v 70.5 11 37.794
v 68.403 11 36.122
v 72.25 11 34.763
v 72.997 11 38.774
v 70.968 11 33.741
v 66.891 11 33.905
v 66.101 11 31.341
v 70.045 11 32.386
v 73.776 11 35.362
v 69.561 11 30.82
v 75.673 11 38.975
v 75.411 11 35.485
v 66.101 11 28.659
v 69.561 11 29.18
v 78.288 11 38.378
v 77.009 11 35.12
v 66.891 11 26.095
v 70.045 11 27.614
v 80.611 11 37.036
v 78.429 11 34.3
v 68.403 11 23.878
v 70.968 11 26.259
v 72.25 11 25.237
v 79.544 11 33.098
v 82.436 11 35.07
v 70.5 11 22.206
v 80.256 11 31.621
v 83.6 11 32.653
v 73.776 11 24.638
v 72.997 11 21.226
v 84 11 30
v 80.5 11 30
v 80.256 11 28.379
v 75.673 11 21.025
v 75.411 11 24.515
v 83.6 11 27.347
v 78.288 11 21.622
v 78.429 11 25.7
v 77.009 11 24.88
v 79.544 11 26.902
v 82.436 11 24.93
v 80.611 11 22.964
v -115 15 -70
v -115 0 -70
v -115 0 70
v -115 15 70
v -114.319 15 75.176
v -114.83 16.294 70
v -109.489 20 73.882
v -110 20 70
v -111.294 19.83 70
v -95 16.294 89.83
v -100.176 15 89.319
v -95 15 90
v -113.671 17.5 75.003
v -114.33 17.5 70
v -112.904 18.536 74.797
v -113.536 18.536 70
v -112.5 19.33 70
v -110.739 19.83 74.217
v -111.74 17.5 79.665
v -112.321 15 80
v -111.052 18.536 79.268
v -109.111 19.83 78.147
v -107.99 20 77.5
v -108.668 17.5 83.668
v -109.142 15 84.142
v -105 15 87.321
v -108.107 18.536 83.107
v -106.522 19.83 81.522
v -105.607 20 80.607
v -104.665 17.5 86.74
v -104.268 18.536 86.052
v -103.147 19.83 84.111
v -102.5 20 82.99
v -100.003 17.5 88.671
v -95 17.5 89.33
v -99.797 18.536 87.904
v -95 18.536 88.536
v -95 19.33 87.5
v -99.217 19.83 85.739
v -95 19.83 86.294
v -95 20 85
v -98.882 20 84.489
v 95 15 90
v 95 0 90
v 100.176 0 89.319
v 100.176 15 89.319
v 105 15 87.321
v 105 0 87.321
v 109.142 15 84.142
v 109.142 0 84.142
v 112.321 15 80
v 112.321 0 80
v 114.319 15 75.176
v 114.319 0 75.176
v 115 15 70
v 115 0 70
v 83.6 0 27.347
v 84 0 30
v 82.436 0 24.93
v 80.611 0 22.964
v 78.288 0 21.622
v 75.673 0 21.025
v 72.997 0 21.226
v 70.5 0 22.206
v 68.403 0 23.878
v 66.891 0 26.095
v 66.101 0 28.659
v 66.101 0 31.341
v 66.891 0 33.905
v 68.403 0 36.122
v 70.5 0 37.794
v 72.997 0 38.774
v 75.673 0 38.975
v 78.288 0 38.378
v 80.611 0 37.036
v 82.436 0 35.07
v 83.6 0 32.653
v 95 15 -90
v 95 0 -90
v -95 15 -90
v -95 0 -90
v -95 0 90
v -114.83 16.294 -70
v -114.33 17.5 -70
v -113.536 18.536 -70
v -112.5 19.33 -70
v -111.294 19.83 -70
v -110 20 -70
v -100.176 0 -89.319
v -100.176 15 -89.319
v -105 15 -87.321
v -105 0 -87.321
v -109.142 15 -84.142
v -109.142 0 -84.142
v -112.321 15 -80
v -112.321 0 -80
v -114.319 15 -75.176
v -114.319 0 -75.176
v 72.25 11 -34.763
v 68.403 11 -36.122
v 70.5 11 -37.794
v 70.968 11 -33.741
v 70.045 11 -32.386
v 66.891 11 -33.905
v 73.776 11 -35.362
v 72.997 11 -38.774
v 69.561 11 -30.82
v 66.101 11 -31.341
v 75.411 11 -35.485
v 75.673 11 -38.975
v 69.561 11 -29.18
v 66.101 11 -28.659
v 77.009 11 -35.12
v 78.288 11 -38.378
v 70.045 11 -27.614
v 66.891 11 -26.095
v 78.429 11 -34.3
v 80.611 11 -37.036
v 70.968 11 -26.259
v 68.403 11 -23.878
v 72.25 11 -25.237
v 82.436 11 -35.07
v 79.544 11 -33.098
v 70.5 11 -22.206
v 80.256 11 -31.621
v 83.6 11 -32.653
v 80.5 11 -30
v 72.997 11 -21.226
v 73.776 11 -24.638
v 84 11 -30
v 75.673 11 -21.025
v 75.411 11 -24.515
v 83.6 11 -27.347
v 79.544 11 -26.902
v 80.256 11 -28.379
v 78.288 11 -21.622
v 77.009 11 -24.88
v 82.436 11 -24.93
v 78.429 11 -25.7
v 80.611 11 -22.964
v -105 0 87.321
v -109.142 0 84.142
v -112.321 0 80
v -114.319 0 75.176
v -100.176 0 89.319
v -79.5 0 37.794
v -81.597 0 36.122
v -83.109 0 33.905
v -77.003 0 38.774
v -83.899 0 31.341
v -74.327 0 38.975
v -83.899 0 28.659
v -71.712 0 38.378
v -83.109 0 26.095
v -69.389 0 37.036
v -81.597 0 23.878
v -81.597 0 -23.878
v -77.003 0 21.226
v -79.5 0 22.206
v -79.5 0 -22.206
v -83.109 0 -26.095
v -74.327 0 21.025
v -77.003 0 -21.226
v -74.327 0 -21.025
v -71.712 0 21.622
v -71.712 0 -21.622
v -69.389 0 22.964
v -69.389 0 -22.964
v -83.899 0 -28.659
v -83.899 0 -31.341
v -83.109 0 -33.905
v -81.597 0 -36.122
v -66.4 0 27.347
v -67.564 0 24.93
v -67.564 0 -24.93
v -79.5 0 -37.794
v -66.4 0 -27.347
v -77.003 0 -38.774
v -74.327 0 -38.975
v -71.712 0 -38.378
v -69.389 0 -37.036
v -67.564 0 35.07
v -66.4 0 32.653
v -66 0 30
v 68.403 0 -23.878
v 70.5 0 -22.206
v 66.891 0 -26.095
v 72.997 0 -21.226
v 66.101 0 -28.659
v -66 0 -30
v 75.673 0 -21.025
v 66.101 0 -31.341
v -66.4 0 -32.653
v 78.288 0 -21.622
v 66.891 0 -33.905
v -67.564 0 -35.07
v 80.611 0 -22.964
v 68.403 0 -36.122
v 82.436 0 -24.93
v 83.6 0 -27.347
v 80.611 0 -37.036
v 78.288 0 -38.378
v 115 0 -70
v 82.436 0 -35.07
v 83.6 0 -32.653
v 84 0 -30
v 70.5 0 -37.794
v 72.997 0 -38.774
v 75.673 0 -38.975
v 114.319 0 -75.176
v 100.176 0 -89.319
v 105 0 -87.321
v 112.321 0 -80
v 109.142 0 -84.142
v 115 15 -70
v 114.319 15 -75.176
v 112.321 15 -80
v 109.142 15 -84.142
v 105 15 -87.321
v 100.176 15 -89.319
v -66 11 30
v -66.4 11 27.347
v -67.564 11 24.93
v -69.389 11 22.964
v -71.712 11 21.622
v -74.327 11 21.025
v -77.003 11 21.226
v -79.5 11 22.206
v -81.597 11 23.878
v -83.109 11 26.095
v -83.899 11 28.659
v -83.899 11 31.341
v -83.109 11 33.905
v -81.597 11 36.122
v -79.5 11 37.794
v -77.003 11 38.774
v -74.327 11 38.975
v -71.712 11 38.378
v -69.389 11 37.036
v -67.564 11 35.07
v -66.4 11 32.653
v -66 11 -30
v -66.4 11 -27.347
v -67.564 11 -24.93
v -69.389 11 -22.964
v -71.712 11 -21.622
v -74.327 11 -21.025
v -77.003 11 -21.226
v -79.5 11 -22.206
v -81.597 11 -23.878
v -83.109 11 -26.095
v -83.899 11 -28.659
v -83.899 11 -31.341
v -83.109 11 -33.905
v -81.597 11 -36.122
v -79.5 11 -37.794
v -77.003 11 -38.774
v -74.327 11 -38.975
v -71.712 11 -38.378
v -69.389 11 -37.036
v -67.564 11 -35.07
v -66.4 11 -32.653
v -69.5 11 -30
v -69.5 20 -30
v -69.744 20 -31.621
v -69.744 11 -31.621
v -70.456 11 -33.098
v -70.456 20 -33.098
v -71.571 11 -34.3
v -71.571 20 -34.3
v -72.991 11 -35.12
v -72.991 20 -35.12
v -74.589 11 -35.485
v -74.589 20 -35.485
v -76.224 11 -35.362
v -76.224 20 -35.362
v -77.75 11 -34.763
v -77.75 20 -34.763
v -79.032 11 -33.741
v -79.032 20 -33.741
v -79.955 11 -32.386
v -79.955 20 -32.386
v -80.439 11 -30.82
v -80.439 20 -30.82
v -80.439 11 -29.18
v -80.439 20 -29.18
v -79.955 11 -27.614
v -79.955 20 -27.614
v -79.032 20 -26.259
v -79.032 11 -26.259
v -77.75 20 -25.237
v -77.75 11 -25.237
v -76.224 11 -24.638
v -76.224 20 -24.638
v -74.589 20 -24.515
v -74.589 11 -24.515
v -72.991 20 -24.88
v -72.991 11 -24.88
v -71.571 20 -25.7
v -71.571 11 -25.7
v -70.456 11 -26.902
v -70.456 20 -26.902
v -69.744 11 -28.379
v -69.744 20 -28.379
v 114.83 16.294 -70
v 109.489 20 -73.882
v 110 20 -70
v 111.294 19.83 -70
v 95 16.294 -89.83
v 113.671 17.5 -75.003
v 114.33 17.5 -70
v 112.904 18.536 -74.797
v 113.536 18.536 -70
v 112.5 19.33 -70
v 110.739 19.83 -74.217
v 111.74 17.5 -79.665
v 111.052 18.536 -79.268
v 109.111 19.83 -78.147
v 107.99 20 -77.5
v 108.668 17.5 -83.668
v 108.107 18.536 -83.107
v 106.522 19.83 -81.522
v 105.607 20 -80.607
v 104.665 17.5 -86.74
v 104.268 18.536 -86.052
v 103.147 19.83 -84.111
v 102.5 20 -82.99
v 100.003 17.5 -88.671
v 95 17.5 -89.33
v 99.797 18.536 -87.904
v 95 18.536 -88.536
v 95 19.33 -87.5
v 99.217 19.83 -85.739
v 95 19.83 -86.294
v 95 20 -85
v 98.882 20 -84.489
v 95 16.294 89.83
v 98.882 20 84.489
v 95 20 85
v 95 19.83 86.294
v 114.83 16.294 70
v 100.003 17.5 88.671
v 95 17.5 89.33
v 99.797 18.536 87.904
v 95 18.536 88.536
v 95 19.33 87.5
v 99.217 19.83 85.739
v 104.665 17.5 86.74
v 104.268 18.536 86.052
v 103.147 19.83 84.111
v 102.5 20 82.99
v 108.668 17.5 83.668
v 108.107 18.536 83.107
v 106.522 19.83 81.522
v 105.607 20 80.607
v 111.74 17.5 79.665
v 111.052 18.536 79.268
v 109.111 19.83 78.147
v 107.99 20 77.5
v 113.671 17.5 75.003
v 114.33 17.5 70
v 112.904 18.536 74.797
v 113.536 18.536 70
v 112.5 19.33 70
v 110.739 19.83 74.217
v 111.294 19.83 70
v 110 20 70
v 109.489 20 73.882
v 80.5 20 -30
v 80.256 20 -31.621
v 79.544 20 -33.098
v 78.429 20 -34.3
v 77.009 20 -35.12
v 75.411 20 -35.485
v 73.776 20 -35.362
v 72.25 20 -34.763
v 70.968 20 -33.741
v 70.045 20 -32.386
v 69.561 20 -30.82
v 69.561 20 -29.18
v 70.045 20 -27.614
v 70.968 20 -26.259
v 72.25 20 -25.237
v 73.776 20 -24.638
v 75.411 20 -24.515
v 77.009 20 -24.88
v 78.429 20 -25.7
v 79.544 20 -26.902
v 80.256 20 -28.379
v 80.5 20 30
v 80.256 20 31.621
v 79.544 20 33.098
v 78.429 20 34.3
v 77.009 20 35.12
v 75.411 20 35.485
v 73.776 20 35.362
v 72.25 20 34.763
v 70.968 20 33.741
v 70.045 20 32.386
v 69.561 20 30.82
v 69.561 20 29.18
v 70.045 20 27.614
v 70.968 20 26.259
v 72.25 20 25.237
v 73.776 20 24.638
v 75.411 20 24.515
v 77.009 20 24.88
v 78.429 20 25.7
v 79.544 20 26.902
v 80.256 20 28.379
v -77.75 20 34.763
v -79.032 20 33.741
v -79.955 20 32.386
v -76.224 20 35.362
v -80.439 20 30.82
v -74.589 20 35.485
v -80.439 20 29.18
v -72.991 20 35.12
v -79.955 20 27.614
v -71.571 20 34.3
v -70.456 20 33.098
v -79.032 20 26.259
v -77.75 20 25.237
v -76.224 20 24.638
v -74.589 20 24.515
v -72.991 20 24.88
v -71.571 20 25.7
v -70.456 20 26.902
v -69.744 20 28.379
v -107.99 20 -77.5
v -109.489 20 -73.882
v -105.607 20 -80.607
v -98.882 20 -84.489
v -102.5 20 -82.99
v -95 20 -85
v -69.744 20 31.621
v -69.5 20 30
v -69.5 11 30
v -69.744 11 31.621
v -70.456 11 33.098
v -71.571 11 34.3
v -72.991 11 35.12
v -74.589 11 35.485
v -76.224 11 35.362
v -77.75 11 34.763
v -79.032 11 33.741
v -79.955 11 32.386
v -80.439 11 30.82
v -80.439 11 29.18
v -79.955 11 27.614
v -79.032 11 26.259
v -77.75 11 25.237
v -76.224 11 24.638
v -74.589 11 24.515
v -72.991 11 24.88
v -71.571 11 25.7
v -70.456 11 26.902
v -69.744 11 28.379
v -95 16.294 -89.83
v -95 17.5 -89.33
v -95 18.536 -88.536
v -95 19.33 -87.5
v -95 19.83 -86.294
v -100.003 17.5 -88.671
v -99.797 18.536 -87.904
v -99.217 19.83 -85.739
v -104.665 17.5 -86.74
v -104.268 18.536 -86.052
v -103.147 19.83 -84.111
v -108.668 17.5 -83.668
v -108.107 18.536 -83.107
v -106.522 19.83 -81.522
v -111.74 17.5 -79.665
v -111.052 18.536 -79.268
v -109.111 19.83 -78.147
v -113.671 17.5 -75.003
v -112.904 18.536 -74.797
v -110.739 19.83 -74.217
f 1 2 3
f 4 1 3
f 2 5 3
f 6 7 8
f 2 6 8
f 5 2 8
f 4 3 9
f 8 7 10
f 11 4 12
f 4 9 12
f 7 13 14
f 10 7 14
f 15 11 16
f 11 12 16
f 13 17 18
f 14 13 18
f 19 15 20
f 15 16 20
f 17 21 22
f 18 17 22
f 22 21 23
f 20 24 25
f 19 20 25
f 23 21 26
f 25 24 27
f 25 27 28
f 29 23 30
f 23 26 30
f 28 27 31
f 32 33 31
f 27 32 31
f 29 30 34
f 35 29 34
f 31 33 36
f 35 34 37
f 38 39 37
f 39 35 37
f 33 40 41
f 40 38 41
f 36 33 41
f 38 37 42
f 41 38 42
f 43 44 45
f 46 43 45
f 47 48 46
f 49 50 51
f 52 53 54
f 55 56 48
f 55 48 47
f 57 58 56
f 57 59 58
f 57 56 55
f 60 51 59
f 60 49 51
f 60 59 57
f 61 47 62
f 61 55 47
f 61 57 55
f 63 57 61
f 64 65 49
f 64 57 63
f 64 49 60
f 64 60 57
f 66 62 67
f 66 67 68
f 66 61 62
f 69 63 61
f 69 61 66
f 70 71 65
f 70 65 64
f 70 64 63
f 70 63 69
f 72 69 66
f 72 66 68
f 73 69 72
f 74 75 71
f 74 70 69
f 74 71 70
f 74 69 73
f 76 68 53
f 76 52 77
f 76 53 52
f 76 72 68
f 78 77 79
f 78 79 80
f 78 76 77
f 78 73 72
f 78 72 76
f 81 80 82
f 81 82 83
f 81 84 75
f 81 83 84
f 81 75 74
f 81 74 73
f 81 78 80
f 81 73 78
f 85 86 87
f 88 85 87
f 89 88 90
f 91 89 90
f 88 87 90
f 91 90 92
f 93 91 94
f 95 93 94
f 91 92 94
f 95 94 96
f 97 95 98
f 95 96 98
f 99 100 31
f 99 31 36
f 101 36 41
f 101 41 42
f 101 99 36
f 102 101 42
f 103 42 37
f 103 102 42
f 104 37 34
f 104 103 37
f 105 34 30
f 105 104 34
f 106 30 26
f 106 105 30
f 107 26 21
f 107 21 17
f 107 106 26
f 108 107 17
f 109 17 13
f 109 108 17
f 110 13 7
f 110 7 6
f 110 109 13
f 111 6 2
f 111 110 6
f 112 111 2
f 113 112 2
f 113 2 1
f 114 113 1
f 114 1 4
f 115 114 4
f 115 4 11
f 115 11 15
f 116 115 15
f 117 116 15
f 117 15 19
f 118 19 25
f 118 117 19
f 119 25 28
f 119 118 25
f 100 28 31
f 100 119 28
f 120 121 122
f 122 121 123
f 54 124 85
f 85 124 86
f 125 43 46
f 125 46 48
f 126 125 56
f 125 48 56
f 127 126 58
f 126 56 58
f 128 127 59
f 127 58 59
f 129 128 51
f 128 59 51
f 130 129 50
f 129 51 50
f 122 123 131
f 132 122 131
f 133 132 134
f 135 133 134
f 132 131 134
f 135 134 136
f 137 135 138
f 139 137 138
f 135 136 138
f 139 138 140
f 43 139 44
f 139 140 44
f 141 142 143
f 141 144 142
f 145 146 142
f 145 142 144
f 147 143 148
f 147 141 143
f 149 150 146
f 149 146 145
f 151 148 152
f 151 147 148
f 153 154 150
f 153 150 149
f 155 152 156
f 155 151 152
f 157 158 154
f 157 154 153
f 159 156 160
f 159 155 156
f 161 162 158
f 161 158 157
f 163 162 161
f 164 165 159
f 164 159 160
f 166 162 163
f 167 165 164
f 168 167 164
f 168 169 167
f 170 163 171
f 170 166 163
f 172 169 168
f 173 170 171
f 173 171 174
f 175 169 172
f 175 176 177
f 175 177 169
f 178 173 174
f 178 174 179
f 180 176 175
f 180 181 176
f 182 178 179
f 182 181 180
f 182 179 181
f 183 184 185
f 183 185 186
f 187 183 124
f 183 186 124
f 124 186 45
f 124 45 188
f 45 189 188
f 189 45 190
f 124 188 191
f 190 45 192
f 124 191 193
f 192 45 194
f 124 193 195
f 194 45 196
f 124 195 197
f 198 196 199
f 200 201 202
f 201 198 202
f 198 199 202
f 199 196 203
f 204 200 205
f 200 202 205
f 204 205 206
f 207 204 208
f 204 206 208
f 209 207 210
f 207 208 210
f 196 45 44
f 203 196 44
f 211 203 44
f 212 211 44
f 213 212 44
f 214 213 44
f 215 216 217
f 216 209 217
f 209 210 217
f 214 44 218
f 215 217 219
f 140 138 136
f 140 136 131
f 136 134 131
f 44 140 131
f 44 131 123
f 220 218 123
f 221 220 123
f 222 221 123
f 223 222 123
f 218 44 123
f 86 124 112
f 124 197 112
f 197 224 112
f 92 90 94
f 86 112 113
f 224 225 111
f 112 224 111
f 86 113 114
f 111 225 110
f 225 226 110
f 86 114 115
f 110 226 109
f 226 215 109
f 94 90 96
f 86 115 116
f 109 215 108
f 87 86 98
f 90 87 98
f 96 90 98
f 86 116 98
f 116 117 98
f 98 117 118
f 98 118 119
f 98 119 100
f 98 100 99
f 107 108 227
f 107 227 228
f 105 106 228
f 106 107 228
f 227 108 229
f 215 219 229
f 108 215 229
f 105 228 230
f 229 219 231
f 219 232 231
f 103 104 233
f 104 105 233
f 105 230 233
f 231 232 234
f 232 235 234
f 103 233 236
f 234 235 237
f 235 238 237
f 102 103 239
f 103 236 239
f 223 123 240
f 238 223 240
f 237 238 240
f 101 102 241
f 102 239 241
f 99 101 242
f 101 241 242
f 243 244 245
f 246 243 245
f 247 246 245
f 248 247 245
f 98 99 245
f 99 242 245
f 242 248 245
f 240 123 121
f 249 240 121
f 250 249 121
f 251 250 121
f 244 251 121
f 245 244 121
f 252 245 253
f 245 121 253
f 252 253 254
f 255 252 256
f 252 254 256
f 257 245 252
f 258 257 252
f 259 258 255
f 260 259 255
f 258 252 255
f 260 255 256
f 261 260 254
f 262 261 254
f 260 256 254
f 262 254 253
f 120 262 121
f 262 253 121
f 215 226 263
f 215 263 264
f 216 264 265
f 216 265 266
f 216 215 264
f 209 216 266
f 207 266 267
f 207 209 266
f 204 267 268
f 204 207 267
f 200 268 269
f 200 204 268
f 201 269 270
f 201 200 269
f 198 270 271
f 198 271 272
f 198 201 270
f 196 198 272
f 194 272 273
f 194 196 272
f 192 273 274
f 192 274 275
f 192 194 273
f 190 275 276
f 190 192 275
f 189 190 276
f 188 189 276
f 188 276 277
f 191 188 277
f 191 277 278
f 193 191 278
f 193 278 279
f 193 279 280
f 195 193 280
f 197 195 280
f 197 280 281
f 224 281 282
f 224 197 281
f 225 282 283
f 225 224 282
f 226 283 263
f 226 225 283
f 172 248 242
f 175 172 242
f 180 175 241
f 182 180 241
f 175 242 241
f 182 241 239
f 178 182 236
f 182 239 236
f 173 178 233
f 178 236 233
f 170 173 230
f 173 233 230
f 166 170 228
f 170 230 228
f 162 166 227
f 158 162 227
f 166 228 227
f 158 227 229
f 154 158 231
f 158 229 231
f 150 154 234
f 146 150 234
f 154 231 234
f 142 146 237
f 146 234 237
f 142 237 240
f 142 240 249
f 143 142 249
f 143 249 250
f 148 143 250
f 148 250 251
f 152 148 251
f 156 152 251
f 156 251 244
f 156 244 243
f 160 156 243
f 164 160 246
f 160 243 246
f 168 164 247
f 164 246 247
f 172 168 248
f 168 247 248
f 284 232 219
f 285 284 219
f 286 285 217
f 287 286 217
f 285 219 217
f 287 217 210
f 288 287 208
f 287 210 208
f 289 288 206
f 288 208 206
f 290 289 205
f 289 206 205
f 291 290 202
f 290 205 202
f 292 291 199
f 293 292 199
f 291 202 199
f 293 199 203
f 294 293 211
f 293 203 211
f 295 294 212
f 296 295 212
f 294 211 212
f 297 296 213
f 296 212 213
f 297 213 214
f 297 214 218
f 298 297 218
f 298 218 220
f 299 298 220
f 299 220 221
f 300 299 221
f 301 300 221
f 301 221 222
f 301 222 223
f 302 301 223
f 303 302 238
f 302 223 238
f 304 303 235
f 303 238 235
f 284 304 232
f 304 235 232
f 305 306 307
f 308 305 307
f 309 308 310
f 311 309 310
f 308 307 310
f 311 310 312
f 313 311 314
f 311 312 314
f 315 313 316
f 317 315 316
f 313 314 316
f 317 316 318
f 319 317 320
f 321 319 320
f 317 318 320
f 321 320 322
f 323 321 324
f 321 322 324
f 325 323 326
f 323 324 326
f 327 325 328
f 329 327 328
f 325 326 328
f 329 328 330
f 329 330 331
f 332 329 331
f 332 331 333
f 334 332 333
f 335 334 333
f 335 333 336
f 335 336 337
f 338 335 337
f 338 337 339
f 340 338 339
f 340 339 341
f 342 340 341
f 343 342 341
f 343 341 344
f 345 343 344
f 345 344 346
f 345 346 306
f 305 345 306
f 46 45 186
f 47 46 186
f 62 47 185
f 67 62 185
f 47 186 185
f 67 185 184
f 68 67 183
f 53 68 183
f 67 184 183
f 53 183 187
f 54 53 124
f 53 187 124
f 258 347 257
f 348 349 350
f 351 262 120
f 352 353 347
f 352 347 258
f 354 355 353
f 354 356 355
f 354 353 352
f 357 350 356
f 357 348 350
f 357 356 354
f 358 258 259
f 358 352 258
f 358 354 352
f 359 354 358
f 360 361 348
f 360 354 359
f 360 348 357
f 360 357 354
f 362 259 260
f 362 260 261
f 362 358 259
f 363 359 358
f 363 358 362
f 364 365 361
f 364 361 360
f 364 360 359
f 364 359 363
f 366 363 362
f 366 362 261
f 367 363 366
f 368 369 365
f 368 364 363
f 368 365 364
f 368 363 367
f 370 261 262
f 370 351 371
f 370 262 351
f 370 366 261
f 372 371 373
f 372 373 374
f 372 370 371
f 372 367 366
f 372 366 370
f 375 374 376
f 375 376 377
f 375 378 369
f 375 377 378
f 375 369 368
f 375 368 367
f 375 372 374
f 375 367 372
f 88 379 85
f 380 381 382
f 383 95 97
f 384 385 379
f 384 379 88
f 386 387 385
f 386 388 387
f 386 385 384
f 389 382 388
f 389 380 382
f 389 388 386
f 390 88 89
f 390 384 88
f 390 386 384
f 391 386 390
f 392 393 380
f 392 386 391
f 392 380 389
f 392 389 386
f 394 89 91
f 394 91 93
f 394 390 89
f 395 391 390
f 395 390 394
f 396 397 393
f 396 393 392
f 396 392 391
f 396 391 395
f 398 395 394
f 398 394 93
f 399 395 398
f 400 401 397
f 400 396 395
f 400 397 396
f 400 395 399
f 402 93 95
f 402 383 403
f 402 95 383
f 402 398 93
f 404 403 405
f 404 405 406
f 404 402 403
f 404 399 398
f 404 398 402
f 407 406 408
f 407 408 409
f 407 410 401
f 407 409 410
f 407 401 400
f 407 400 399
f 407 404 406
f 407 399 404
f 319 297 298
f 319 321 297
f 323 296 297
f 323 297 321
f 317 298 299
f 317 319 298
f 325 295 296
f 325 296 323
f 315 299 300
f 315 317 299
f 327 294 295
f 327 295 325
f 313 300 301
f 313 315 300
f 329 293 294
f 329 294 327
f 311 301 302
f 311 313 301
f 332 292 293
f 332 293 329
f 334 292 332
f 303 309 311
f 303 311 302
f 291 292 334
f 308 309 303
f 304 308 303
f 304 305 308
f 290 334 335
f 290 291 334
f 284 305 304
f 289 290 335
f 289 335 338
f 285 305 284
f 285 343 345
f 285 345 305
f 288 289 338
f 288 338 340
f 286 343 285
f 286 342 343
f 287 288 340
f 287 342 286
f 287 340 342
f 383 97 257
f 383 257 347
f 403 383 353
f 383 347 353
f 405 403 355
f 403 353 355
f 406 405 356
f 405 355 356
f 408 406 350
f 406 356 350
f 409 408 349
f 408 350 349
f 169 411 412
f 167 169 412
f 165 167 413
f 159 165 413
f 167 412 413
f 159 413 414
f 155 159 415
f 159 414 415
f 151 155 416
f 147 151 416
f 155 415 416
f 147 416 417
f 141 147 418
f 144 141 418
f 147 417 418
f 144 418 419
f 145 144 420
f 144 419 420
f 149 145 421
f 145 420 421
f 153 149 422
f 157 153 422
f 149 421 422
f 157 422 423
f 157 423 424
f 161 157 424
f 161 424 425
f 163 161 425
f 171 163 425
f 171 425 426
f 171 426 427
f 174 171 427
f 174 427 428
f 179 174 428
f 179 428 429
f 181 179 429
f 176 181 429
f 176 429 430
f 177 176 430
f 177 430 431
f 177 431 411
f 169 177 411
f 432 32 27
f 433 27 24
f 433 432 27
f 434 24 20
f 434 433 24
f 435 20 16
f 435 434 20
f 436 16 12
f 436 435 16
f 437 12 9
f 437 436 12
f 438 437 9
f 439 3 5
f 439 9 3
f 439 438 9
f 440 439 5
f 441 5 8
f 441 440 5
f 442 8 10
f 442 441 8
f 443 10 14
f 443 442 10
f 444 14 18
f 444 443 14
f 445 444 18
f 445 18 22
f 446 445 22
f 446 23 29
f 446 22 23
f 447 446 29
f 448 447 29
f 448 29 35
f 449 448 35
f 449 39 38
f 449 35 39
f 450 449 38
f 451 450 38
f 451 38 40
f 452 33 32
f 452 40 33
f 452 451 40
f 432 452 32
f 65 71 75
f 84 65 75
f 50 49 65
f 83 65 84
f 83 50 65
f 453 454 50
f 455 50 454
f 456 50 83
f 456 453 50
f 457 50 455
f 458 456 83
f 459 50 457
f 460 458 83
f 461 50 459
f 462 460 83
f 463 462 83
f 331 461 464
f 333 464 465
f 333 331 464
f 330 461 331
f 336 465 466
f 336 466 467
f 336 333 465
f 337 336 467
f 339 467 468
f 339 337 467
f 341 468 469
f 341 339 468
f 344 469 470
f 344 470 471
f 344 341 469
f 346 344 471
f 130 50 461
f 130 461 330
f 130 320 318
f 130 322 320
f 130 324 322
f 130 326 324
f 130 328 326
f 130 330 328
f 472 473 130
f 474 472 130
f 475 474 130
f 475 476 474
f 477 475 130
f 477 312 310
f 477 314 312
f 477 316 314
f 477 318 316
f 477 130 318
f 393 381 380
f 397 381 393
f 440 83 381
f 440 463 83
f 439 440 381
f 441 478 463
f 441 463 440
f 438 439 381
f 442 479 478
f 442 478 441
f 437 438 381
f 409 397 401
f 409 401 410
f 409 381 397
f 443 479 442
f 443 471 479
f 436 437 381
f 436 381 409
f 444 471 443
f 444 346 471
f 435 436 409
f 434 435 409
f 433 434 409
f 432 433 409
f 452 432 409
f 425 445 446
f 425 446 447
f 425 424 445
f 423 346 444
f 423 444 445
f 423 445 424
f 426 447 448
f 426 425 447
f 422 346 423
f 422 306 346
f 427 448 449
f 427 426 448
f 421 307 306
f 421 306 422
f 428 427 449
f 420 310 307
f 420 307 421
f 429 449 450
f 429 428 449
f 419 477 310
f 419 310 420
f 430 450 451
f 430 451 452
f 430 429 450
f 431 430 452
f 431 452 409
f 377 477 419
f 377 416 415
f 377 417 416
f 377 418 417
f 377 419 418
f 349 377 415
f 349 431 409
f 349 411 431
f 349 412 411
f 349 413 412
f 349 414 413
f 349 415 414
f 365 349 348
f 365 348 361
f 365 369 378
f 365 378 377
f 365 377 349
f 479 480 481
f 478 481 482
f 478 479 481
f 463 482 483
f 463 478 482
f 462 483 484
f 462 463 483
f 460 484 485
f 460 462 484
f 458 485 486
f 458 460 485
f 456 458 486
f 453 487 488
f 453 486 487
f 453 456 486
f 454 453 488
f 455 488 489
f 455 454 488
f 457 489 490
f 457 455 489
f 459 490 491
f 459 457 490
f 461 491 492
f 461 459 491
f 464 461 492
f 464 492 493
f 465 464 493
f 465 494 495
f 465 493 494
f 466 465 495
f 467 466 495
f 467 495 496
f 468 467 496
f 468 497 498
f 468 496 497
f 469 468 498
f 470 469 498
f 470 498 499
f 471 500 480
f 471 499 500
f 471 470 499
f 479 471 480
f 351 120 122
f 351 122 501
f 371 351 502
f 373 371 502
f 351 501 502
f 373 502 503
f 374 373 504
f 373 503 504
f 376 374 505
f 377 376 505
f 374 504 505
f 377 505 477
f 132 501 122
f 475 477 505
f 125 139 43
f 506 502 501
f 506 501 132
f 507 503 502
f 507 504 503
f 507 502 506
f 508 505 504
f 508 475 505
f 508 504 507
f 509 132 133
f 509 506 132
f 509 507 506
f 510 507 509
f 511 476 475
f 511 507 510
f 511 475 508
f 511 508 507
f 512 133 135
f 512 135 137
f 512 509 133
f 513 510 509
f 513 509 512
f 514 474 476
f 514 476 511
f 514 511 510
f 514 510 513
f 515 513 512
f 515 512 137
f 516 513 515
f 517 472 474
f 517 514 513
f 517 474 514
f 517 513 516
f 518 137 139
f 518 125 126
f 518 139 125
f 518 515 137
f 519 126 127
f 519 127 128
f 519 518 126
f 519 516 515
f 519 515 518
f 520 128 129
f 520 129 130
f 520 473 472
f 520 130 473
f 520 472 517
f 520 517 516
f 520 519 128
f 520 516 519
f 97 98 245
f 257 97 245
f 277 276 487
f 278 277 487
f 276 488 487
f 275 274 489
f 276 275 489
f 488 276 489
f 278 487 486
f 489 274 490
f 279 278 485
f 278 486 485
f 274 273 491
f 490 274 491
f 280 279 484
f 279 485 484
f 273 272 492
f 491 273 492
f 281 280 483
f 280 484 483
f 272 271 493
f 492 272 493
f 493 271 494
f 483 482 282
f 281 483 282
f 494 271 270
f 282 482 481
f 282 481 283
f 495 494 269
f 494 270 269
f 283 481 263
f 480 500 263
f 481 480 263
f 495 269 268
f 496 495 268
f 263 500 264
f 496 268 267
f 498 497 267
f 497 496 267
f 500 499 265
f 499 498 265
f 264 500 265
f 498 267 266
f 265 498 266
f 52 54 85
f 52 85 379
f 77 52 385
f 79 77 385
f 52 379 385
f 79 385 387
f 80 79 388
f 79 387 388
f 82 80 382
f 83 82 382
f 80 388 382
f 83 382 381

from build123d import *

# Parameters (mm, degrees)
BOSS_EXTRUDE1_DEPTH = 20
FILLET1_R           = 5
SKETCH2_R           = 5.5
CUT_EXTRUDE1_DEPTH  = 21
SKETCH3_R           = 9
CUT_EXTRUDE2_DEPTH  = 11


with BuildPart() as part:
    # Sketch1 → Boss-Extrude1 (new body)
    with BuildSketch(Plane(origin=(0, 0, 0), x_dir=(1, 0, 0), z_dir=(0, 1, 0))):
        with BuildLine():
            Line((-115, 70), (-115, -70))
            ThreePointArc((-115, -70), (-109.142135624, -84.142135624), (-95, -90))
            Line((-95, -90), (95, -90))
            ThreePointArc((95, -90), (109.142135624, -84.142135624), (115, -70))
            Line((115, -70), (115, 70))
            ThreePointArc((115, 70), (109.142135624, 84.142135624), (95, 90))
            Line((95, 90), (-95, 90))
            ThreePointArc((-95, 90), (-109.142135624, 84.142135624), (-115, 70))
        make_face()
    extrude(amount=BOSS_EXTRUDE1_DEPTH)

    # Fillet1
    fillet1_edges = [part.edges().sort_by_distance(p)[0] for p in [
        (109.142135624, 20, 84.142135624),
        (115, 20, 0),
        (109.142135624, 20, -84.142135624),
        (0, 20, -90),
        (-109.142135624, 20, -84.142135624),
        (-115, 20, 0),
        (-109.142135624, 20, 84.142135624),
        (0, 20, 90),
    ]]
    fillet(fillet1_edges, radius=FILLET1_R)

    # Sketch2 → Cut-Extrude1 (cut, through all)
    with BuildSketch(Plane(origin=(0, 20, 0), x_dir=(1, 0, 0), z_dir=(0, 1, 0))):
        with Locations((-75, 30)):
            Circle(SKETCH2_R)
        with Locations((75, 30)):
            Circle(SKETCH2_R)
    cut_extrude1 = extrude(amount=-CUT_EXTRUDE1_DEPTH, mode=Mode.SUBTRACT)

    # Sketch3 → Cut-Extrude2 (cut)
    with BuildSketch(Plane.XZ):
        with Locations((-75, -30)):
            Circle(SKETCH3_R)
        with Locations((75, -30)):
            Circle(SKETCH3_R)
    cut_extrude2 = extrude(amount=-CUT_EXTRUDE2_DEPTH, mode=Mode.SUBTRACT)

    # Mirror1: Cut-Extrude1, Cut-Extrude2 across plane
    add(cut_extrude1.mirror(Plane.XY), mode=Mode.SUBTRACT)
    add(cut_extrude2.mirror(Plane.XY), mode=Mode.SUBTRACT)


solid = part.part
